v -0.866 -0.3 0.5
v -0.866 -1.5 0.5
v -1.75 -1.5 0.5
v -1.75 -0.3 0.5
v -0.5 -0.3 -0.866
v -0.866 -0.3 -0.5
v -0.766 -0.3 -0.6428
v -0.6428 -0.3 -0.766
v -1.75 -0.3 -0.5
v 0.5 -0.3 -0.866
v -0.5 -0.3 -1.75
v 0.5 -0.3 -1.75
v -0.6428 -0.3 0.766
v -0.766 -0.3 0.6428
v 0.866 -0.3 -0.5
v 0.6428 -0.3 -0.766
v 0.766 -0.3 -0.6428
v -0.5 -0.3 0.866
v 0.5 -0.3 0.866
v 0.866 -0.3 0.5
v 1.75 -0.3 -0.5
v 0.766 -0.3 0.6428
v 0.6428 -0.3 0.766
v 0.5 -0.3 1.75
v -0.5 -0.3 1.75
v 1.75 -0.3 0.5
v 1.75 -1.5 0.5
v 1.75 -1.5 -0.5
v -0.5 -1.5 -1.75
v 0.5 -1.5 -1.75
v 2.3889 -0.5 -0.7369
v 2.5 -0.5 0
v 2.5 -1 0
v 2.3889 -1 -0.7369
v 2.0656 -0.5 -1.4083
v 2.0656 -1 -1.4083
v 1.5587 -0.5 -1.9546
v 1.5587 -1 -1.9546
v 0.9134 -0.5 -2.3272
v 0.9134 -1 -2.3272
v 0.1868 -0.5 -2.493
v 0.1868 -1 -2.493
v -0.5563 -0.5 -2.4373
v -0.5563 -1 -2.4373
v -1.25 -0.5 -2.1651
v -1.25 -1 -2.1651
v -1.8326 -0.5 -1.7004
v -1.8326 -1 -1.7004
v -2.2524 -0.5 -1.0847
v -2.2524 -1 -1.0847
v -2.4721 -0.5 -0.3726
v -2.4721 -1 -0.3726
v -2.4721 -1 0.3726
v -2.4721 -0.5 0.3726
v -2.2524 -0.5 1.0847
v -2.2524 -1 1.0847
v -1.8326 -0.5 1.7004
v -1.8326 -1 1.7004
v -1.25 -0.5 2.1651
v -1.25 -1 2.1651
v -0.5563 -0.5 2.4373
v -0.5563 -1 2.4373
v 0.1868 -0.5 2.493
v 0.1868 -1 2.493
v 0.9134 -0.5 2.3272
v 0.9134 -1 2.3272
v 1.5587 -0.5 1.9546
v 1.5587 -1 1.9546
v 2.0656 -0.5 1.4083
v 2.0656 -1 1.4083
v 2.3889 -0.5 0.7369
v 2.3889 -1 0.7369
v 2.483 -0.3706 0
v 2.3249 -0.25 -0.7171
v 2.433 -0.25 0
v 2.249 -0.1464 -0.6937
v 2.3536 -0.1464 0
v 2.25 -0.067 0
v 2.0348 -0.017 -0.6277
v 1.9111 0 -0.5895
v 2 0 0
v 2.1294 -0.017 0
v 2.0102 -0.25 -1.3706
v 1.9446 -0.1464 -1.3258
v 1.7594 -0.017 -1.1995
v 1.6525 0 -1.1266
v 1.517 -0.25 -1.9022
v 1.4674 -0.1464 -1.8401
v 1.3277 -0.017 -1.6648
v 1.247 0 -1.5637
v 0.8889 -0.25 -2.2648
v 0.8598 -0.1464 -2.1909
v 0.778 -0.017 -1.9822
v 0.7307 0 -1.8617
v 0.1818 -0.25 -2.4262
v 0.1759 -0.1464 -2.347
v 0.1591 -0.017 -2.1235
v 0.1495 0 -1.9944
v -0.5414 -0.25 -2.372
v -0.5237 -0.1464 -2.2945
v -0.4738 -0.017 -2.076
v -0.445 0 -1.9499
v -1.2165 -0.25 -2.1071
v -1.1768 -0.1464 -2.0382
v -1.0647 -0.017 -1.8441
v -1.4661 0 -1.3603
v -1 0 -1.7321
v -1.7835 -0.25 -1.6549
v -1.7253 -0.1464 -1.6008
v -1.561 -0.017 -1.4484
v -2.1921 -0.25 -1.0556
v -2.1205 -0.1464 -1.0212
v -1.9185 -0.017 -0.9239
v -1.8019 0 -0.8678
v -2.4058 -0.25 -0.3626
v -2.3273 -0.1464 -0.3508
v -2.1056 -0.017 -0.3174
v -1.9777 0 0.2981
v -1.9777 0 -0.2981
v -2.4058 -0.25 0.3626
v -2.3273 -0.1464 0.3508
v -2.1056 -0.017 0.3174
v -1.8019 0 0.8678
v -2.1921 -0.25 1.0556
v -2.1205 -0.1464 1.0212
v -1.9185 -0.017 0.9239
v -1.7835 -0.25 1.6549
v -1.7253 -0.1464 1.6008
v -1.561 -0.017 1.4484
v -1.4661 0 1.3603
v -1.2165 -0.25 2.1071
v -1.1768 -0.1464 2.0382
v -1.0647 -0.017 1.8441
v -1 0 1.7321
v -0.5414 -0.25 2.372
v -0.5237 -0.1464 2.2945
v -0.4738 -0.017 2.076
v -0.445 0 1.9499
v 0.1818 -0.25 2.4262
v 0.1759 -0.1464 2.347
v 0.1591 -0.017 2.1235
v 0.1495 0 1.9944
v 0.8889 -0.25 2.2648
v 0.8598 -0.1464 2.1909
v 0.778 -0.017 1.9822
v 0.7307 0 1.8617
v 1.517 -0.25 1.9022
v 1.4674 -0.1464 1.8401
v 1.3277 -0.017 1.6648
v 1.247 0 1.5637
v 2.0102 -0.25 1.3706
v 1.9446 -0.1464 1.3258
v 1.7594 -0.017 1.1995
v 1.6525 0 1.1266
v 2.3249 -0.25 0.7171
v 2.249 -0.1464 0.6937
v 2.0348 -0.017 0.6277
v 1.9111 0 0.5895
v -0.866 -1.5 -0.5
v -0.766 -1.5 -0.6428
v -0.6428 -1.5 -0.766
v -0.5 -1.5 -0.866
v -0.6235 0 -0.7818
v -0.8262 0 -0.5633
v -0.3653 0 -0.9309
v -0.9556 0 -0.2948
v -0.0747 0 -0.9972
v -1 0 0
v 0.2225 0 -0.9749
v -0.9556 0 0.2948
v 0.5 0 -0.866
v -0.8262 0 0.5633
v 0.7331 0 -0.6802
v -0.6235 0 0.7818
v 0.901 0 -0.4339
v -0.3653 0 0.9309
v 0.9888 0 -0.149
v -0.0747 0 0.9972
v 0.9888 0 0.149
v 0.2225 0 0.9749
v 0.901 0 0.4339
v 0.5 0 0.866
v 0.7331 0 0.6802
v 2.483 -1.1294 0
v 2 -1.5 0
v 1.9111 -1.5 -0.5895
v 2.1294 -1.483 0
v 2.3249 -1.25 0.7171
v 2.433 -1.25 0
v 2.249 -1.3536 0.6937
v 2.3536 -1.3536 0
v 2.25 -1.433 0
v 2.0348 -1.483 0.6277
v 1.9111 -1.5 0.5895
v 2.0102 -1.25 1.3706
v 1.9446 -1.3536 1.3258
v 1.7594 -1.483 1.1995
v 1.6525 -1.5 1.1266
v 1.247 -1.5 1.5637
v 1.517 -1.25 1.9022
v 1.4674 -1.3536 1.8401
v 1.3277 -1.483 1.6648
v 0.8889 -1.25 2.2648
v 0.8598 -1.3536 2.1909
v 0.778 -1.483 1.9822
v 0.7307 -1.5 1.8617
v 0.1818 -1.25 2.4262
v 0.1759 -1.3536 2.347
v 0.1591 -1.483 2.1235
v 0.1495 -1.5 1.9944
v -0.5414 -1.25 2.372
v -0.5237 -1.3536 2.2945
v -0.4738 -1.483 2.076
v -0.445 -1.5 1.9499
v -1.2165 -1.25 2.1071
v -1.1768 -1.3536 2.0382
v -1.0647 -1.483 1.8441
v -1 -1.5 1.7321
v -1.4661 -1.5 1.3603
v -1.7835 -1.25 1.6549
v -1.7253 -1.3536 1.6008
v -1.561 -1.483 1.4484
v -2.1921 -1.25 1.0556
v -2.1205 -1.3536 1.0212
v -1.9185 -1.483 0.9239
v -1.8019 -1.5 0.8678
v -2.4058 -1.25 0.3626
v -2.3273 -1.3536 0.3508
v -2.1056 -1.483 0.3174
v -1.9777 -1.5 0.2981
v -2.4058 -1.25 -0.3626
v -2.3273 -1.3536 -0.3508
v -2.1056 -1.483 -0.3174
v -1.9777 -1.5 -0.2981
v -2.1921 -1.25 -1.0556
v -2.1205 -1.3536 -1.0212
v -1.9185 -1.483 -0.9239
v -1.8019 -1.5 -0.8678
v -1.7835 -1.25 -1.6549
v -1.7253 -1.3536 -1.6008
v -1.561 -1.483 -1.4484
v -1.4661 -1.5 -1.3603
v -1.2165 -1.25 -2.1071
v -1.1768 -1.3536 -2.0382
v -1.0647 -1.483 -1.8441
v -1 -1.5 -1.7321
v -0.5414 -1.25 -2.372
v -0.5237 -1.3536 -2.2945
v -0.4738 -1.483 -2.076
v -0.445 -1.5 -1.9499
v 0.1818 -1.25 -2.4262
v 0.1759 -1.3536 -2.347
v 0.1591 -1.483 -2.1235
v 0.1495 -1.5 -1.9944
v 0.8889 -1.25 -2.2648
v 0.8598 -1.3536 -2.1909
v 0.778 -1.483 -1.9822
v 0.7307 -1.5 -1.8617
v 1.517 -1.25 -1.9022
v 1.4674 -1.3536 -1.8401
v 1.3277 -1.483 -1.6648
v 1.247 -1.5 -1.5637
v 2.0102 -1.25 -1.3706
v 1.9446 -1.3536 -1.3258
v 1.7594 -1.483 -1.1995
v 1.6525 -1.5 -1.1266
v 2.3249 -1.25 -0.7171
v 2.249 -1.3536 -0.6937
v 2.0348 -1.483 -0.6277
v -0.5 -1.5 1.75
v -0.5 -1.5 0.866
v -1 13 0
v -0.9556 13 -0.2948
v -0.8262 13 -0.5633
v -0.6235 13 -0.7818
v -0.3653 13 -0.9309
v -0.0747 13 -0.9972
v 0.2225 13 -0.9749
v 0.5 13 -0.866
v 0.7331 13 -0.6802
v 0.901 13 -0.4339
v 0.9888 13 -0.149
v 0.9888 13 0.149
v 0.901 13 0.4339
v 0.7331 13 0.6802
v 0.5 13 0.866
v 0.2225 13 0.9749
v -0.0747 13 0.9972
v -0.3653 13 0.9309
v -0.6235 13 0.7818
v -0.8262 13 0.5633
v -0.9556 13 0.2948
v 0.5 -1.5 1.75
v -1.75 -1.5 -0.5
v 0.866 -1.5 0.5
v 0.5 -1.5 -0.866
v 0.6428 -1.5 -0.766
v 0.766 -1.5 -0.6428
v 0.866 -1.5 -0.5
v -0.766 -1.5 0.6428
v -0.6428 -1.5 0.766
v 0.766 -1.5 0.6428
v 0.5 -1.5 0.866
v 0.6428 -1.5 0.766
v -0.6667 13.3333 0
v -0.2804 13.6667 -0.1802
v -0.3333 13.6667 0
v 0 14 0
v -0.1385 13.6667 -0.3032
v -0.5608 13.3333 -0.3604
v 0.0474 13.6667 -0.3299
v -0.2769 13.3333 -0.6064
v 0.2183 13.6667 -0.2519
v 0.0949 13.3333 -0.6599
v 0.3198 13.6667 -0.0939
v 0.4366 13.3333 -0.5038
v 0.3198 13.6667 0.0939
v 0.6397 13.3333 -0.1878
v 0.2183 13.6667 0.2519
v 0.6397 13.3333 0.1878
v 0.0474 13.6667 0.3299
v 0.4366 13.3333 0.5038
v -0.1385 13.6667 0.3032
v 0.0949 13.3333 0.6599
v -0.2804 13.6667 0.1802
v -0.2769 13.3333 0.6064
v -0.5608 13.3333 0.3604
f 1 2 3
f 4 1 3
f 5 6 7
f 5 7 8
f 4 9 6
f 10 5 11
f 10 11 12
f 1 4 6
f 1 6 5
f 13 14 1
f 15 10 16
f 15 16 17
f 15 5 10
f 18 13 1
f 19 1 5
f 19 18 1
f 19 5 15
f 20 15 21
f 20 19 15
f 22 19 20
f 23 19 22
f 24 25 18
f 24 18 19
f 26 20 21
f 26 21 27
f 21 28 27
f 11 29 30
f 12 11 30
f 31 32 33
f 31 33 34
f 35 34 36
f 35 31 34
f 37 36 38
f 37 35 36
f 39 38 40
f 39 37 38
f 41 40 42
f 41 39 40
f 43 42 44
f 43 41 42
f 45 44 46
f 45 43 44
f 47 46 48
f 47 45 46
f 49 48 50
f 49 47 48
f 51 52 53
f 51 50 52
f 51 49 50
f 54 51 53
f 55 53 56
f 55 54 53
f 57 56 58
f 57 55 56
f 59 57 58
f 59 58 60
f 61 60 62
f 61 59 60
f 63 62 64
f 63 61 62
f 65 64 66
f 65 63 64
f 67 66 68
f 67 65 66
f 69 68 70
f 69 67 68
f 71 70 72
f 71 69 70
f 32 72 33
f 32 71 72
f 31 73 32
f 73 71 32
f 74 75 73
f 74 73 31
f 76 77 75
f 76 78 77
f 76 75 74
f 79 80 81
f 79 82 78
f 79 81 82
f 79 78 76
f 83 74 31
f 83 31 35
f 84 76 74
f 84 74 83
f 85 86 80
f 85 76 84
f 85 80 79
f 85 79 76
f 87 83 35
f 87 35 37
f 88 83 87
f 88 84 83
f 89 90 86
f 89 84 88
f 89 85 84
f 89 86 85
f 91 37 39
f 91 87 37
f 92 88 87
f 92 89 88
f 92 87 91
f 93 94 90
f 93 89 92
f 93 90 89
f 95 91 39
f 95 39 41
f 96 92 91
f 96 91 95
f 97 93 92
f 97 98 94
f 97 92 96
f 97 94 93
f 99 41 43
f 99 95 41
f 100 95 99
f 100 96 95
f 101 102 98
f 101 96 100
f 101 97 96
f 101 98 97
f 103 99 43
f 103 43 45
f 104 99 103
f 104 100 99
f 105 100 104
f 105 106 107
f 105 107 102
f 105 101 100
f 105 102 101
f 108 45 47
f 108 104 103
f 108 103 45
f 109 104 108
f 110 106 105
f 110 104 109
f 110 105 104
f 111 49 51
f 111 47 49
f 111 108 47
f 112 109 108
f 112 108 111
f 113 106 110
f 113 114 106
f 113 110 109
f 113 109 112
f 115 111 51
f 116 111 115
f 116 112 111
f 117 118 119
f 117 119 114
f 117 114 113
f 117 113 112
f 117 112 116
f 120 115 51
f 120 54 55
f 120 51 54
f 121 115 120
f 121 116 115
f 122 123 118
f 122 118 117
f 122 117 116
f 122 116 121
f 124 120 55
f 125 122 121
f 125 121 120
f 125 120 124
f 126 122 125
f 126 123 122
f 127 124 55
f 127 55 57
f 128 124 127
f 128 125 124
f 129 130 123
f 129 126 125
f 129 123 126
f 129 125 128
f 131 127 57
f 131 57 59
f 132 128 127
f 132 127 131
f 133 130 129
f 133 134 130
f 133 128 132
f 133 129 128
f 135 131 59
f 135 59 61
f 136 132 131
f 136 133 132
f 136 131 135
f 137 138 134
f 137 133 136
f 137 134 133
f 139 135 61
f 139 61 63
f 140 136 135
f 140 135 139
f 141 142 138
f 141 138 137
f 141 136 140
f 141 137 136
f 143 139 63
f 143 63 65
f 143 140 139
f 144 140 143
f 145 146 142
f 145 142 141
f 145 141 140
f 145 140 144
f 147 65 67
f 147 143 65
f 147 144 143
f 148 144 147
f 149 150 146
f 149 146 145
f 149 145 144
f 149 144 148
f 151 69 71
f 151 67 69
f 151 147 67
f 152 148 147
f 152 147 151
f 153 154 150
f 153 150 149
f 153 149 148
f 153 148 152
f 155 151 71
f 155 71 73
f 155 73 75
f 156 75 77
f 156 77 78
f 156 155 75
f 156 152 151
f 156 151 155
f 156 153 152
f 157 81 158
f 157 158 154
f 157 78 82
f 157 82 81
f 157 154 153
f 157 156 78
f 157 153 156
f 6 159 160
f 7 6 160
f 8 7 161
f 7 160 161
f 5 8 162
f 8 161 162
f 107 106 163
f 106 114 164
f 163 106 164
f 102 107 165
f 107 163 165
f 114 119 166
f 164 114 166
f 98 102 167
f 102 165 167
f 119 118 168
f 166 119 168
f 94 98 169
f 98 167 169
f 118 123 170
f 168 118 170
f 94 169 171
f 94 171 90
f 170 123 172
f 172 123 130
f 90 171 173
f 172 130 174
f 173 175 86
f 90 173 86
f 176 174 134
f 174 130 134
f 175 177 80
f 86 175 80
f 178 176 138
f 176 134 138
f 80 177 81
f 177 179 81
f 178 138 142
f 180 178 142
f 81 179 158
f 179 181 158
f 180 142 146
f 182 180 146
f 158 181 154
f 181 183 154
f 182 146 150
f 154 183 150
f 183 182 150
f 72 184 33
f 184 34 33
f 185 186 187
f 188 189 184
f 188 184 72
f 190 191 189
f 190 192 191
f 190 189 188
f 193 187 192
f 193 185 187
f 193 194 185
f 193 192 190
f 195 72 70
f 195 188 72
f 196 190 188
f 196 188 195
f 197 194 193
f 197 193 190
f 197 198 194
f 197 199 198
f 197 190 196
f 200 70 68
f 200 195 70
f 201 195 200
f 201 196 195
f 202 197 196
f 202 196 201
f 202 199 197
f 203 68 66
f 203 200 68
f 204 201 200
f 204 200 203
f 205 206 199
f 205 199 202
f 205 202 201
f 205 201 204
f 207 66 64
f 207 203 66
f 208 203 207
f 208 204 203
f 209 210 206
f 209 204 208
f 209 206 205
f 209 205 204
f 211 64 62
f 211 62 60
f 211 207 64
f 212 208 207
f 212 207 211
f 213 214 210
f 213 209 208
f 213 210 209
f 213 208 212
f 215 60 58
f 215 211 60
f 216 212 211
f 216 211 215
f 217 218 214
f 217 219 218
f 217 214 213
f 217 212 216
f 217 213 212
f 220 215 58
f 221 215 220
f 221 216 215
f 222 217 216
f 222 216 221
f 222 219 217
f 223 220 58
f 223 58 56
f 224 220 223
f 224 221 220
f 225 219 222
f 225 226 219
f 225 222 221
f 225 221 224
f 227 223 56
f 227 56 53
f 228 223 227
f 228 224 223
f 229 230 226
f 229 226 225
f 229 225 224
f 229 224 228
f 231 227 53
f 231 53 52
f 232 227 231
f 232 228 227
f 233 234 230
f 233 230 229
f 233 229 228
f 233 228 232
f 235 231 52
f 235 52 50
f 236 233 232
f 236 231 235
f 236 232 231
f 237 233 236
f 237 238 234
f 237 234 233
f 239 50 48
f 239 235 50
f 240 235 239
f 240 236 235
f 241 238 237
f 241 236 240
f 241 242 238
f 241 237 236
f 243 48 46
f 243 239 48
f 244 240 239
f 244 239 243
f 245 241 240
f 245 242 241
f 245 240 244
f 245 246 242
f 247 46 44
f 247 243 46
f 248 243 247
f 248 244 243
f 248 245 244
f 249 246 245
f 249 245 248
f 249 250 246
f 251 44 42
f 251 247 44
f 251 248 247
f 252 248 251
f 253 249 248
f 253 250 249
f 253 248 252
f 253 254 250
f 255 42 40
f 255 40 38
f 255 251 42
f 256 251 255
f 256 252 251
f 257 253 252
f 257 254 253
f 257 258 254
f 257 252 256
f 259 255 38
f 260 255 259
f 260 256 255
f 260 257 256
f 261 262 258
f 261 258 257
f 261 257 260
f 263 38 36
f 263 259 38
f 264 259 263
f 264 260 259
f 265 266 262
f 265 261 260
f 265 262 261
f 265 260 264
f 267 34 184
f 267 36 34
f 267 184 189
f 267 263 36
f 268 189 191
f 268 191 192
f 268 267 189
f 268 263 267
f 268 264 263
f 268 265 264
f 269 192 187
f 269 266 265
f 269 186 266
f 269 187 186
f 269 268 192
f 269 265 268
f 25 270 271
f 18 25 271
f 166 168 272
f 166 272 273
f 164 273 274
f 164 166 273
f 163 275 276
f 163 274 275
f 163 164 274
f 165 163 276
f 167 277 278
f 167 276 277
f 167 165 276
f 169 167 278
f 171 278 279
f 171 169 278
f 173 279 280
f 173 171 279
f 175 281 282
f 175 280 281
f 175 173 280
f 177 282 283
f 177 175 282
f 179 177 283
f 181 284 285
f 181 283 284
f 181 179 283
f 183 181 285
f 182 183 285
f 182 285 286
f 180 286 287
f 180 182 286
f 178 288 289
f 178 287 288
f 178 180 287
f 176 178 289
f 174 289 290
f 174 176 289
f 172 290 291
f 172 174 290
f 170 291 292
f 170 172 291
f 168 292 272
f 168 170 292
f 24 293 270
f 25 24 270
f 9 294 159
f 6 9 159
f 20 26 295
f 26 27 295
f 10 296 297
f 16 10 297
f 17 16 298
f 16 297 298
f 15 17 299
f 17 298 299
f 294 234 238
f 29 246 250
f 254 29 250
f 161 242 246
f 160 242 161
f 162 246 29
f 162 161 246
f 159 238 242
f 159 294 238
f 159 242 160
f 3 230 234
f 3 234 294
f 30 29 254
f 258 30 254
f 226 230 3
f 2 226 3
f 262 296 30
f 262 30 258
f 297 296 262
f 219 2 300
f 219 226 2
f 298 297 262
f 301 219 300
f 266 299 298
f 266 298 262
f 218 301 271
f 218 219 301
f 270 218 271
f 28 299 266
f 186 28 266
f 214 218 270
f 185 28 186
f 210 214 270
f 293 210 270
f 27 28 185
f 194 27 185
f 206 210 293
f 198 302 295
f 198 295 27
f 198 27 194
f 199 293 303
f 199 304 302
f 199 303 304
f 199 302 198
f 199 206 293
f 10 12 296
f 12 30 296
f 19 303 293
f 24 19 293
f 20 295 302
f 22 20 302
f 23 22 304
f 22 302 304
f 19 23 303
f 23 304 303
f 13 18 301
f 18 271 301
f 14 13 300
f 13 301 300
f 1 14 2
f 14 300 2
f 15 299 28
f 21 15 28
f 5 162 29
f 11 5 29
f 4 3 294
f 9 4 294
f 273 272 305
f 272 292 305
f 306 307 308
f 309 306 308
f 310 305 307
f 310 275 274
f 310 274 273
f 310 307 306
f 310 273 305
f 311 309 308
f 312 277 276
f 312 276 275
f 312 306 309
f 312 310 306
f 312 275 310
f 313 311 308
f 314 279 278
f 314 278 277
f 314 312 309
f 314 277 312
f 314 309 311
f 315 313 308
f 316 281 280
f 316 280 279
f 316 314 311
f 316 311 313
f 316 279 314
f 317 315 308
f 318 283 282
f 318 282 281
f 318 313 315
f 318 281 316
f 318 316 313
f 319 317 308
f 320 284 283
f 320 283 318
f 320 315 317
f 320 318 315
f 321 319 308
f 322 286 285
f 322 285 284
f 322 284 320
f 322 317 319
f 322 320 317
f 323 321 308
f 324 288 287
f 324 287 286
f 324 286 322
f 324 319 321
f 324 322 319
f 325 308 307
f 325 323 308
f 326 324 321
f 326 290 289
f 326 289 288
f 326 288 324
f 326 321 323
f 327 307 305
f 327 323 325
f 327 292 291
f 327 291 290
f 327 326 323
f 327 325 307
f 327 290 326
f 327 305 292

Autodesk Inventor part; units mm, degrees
ref_plane "YZ Plane" through (0, 0, 0) normal (1, 0, 0) x (0, 1, 0)
ref_plane "XZ Plane" through (0, 0, 0) normal (0, 1, 0) x (-1, 0, 0)
ref_plane "XY Plane" through (0, 0, 0) normal (0, 0, 1) x (1, 0, 0)
sketch "Sketch1" plane through (0, 0, 0) normal (0, 1, 0) x (-1, 0, 0)
  circle A0 centre (0, 0) radius 1
  dimension "d0" = 2
extrude "Extrusion1" add sketch "Sketch1" along normal blind 14
sketch "Sketch2" plane through (0, 0, 0) normal (0, -1, 0) x (1, 0, 0)
  circle A0 centre (0, 0) radius 2.5
extrude "Extrusion2" add sketch "Sketch2" along normal blind 1.5
fillet "Fillet1" radius 0.5 2 edges at (-2.5, -1.5, 0) (-2.5, 0, 0)
sketch "Sketch3" plane through (0, -1.5, 0) normal (0, -1, 0) x (1, 0, 0)
  line L0 (1.75, -0.5) -> (1.75, 0.5)
  line L1 (-1.75, 0.5) -> (-1.75, -0.5)
  line L2 (0.5, 1.75) -> (-0.5, 1.75)
  line L3 (-0.5, -1.75) -> (0.5, -1.75)
  line L4 (1.75, 0.5) -> (0.866, 0.5)
  line L5 (-0.866, 0.5) -> (-1.75, 0.5)
  line L6 (-0.5, 1.75) -> (-0.5, 0.866)
  line L7 (-0.5, -0.866) -> (-0.5, -1.75)
  line L8 (0.5, 0.866) -> (0.5, 1.75)
  line L9 (-1.75, -0.5) -> (-0.866, -0.5)
  line L10 (0.866, -0.5) -> (1.75, -0.5)
  line L11 (0.5, -1.75) -> (0.5, -0.866)
  arc A0 (-0.5, 0.866) -> (-0.866, 0.5) centre (0, 0) ccw
  arc A1 (0.866, 0.5) -> (0.5, 0.866) centre (0, 0) ccw
  arc A2 (-0.866, -0.5) -> (-0.5, -0.866) centre (0, 0) ccw
  arc A3 (0.5, -0.866) -> (0.866, -0.5) centre (0, 0) ccw
extrude "Extrusion3" cut sketch "Sketch3" against normal blind 1.2
chamfer "Chamfer1" distance 1 angle 45 1 edges at (1, 14, 0)
thread "Thread1" size "M2x0.25" class "6g" standard "ANSI Metric M Profile" full length
properties part number "parafuso interno da ponte"
